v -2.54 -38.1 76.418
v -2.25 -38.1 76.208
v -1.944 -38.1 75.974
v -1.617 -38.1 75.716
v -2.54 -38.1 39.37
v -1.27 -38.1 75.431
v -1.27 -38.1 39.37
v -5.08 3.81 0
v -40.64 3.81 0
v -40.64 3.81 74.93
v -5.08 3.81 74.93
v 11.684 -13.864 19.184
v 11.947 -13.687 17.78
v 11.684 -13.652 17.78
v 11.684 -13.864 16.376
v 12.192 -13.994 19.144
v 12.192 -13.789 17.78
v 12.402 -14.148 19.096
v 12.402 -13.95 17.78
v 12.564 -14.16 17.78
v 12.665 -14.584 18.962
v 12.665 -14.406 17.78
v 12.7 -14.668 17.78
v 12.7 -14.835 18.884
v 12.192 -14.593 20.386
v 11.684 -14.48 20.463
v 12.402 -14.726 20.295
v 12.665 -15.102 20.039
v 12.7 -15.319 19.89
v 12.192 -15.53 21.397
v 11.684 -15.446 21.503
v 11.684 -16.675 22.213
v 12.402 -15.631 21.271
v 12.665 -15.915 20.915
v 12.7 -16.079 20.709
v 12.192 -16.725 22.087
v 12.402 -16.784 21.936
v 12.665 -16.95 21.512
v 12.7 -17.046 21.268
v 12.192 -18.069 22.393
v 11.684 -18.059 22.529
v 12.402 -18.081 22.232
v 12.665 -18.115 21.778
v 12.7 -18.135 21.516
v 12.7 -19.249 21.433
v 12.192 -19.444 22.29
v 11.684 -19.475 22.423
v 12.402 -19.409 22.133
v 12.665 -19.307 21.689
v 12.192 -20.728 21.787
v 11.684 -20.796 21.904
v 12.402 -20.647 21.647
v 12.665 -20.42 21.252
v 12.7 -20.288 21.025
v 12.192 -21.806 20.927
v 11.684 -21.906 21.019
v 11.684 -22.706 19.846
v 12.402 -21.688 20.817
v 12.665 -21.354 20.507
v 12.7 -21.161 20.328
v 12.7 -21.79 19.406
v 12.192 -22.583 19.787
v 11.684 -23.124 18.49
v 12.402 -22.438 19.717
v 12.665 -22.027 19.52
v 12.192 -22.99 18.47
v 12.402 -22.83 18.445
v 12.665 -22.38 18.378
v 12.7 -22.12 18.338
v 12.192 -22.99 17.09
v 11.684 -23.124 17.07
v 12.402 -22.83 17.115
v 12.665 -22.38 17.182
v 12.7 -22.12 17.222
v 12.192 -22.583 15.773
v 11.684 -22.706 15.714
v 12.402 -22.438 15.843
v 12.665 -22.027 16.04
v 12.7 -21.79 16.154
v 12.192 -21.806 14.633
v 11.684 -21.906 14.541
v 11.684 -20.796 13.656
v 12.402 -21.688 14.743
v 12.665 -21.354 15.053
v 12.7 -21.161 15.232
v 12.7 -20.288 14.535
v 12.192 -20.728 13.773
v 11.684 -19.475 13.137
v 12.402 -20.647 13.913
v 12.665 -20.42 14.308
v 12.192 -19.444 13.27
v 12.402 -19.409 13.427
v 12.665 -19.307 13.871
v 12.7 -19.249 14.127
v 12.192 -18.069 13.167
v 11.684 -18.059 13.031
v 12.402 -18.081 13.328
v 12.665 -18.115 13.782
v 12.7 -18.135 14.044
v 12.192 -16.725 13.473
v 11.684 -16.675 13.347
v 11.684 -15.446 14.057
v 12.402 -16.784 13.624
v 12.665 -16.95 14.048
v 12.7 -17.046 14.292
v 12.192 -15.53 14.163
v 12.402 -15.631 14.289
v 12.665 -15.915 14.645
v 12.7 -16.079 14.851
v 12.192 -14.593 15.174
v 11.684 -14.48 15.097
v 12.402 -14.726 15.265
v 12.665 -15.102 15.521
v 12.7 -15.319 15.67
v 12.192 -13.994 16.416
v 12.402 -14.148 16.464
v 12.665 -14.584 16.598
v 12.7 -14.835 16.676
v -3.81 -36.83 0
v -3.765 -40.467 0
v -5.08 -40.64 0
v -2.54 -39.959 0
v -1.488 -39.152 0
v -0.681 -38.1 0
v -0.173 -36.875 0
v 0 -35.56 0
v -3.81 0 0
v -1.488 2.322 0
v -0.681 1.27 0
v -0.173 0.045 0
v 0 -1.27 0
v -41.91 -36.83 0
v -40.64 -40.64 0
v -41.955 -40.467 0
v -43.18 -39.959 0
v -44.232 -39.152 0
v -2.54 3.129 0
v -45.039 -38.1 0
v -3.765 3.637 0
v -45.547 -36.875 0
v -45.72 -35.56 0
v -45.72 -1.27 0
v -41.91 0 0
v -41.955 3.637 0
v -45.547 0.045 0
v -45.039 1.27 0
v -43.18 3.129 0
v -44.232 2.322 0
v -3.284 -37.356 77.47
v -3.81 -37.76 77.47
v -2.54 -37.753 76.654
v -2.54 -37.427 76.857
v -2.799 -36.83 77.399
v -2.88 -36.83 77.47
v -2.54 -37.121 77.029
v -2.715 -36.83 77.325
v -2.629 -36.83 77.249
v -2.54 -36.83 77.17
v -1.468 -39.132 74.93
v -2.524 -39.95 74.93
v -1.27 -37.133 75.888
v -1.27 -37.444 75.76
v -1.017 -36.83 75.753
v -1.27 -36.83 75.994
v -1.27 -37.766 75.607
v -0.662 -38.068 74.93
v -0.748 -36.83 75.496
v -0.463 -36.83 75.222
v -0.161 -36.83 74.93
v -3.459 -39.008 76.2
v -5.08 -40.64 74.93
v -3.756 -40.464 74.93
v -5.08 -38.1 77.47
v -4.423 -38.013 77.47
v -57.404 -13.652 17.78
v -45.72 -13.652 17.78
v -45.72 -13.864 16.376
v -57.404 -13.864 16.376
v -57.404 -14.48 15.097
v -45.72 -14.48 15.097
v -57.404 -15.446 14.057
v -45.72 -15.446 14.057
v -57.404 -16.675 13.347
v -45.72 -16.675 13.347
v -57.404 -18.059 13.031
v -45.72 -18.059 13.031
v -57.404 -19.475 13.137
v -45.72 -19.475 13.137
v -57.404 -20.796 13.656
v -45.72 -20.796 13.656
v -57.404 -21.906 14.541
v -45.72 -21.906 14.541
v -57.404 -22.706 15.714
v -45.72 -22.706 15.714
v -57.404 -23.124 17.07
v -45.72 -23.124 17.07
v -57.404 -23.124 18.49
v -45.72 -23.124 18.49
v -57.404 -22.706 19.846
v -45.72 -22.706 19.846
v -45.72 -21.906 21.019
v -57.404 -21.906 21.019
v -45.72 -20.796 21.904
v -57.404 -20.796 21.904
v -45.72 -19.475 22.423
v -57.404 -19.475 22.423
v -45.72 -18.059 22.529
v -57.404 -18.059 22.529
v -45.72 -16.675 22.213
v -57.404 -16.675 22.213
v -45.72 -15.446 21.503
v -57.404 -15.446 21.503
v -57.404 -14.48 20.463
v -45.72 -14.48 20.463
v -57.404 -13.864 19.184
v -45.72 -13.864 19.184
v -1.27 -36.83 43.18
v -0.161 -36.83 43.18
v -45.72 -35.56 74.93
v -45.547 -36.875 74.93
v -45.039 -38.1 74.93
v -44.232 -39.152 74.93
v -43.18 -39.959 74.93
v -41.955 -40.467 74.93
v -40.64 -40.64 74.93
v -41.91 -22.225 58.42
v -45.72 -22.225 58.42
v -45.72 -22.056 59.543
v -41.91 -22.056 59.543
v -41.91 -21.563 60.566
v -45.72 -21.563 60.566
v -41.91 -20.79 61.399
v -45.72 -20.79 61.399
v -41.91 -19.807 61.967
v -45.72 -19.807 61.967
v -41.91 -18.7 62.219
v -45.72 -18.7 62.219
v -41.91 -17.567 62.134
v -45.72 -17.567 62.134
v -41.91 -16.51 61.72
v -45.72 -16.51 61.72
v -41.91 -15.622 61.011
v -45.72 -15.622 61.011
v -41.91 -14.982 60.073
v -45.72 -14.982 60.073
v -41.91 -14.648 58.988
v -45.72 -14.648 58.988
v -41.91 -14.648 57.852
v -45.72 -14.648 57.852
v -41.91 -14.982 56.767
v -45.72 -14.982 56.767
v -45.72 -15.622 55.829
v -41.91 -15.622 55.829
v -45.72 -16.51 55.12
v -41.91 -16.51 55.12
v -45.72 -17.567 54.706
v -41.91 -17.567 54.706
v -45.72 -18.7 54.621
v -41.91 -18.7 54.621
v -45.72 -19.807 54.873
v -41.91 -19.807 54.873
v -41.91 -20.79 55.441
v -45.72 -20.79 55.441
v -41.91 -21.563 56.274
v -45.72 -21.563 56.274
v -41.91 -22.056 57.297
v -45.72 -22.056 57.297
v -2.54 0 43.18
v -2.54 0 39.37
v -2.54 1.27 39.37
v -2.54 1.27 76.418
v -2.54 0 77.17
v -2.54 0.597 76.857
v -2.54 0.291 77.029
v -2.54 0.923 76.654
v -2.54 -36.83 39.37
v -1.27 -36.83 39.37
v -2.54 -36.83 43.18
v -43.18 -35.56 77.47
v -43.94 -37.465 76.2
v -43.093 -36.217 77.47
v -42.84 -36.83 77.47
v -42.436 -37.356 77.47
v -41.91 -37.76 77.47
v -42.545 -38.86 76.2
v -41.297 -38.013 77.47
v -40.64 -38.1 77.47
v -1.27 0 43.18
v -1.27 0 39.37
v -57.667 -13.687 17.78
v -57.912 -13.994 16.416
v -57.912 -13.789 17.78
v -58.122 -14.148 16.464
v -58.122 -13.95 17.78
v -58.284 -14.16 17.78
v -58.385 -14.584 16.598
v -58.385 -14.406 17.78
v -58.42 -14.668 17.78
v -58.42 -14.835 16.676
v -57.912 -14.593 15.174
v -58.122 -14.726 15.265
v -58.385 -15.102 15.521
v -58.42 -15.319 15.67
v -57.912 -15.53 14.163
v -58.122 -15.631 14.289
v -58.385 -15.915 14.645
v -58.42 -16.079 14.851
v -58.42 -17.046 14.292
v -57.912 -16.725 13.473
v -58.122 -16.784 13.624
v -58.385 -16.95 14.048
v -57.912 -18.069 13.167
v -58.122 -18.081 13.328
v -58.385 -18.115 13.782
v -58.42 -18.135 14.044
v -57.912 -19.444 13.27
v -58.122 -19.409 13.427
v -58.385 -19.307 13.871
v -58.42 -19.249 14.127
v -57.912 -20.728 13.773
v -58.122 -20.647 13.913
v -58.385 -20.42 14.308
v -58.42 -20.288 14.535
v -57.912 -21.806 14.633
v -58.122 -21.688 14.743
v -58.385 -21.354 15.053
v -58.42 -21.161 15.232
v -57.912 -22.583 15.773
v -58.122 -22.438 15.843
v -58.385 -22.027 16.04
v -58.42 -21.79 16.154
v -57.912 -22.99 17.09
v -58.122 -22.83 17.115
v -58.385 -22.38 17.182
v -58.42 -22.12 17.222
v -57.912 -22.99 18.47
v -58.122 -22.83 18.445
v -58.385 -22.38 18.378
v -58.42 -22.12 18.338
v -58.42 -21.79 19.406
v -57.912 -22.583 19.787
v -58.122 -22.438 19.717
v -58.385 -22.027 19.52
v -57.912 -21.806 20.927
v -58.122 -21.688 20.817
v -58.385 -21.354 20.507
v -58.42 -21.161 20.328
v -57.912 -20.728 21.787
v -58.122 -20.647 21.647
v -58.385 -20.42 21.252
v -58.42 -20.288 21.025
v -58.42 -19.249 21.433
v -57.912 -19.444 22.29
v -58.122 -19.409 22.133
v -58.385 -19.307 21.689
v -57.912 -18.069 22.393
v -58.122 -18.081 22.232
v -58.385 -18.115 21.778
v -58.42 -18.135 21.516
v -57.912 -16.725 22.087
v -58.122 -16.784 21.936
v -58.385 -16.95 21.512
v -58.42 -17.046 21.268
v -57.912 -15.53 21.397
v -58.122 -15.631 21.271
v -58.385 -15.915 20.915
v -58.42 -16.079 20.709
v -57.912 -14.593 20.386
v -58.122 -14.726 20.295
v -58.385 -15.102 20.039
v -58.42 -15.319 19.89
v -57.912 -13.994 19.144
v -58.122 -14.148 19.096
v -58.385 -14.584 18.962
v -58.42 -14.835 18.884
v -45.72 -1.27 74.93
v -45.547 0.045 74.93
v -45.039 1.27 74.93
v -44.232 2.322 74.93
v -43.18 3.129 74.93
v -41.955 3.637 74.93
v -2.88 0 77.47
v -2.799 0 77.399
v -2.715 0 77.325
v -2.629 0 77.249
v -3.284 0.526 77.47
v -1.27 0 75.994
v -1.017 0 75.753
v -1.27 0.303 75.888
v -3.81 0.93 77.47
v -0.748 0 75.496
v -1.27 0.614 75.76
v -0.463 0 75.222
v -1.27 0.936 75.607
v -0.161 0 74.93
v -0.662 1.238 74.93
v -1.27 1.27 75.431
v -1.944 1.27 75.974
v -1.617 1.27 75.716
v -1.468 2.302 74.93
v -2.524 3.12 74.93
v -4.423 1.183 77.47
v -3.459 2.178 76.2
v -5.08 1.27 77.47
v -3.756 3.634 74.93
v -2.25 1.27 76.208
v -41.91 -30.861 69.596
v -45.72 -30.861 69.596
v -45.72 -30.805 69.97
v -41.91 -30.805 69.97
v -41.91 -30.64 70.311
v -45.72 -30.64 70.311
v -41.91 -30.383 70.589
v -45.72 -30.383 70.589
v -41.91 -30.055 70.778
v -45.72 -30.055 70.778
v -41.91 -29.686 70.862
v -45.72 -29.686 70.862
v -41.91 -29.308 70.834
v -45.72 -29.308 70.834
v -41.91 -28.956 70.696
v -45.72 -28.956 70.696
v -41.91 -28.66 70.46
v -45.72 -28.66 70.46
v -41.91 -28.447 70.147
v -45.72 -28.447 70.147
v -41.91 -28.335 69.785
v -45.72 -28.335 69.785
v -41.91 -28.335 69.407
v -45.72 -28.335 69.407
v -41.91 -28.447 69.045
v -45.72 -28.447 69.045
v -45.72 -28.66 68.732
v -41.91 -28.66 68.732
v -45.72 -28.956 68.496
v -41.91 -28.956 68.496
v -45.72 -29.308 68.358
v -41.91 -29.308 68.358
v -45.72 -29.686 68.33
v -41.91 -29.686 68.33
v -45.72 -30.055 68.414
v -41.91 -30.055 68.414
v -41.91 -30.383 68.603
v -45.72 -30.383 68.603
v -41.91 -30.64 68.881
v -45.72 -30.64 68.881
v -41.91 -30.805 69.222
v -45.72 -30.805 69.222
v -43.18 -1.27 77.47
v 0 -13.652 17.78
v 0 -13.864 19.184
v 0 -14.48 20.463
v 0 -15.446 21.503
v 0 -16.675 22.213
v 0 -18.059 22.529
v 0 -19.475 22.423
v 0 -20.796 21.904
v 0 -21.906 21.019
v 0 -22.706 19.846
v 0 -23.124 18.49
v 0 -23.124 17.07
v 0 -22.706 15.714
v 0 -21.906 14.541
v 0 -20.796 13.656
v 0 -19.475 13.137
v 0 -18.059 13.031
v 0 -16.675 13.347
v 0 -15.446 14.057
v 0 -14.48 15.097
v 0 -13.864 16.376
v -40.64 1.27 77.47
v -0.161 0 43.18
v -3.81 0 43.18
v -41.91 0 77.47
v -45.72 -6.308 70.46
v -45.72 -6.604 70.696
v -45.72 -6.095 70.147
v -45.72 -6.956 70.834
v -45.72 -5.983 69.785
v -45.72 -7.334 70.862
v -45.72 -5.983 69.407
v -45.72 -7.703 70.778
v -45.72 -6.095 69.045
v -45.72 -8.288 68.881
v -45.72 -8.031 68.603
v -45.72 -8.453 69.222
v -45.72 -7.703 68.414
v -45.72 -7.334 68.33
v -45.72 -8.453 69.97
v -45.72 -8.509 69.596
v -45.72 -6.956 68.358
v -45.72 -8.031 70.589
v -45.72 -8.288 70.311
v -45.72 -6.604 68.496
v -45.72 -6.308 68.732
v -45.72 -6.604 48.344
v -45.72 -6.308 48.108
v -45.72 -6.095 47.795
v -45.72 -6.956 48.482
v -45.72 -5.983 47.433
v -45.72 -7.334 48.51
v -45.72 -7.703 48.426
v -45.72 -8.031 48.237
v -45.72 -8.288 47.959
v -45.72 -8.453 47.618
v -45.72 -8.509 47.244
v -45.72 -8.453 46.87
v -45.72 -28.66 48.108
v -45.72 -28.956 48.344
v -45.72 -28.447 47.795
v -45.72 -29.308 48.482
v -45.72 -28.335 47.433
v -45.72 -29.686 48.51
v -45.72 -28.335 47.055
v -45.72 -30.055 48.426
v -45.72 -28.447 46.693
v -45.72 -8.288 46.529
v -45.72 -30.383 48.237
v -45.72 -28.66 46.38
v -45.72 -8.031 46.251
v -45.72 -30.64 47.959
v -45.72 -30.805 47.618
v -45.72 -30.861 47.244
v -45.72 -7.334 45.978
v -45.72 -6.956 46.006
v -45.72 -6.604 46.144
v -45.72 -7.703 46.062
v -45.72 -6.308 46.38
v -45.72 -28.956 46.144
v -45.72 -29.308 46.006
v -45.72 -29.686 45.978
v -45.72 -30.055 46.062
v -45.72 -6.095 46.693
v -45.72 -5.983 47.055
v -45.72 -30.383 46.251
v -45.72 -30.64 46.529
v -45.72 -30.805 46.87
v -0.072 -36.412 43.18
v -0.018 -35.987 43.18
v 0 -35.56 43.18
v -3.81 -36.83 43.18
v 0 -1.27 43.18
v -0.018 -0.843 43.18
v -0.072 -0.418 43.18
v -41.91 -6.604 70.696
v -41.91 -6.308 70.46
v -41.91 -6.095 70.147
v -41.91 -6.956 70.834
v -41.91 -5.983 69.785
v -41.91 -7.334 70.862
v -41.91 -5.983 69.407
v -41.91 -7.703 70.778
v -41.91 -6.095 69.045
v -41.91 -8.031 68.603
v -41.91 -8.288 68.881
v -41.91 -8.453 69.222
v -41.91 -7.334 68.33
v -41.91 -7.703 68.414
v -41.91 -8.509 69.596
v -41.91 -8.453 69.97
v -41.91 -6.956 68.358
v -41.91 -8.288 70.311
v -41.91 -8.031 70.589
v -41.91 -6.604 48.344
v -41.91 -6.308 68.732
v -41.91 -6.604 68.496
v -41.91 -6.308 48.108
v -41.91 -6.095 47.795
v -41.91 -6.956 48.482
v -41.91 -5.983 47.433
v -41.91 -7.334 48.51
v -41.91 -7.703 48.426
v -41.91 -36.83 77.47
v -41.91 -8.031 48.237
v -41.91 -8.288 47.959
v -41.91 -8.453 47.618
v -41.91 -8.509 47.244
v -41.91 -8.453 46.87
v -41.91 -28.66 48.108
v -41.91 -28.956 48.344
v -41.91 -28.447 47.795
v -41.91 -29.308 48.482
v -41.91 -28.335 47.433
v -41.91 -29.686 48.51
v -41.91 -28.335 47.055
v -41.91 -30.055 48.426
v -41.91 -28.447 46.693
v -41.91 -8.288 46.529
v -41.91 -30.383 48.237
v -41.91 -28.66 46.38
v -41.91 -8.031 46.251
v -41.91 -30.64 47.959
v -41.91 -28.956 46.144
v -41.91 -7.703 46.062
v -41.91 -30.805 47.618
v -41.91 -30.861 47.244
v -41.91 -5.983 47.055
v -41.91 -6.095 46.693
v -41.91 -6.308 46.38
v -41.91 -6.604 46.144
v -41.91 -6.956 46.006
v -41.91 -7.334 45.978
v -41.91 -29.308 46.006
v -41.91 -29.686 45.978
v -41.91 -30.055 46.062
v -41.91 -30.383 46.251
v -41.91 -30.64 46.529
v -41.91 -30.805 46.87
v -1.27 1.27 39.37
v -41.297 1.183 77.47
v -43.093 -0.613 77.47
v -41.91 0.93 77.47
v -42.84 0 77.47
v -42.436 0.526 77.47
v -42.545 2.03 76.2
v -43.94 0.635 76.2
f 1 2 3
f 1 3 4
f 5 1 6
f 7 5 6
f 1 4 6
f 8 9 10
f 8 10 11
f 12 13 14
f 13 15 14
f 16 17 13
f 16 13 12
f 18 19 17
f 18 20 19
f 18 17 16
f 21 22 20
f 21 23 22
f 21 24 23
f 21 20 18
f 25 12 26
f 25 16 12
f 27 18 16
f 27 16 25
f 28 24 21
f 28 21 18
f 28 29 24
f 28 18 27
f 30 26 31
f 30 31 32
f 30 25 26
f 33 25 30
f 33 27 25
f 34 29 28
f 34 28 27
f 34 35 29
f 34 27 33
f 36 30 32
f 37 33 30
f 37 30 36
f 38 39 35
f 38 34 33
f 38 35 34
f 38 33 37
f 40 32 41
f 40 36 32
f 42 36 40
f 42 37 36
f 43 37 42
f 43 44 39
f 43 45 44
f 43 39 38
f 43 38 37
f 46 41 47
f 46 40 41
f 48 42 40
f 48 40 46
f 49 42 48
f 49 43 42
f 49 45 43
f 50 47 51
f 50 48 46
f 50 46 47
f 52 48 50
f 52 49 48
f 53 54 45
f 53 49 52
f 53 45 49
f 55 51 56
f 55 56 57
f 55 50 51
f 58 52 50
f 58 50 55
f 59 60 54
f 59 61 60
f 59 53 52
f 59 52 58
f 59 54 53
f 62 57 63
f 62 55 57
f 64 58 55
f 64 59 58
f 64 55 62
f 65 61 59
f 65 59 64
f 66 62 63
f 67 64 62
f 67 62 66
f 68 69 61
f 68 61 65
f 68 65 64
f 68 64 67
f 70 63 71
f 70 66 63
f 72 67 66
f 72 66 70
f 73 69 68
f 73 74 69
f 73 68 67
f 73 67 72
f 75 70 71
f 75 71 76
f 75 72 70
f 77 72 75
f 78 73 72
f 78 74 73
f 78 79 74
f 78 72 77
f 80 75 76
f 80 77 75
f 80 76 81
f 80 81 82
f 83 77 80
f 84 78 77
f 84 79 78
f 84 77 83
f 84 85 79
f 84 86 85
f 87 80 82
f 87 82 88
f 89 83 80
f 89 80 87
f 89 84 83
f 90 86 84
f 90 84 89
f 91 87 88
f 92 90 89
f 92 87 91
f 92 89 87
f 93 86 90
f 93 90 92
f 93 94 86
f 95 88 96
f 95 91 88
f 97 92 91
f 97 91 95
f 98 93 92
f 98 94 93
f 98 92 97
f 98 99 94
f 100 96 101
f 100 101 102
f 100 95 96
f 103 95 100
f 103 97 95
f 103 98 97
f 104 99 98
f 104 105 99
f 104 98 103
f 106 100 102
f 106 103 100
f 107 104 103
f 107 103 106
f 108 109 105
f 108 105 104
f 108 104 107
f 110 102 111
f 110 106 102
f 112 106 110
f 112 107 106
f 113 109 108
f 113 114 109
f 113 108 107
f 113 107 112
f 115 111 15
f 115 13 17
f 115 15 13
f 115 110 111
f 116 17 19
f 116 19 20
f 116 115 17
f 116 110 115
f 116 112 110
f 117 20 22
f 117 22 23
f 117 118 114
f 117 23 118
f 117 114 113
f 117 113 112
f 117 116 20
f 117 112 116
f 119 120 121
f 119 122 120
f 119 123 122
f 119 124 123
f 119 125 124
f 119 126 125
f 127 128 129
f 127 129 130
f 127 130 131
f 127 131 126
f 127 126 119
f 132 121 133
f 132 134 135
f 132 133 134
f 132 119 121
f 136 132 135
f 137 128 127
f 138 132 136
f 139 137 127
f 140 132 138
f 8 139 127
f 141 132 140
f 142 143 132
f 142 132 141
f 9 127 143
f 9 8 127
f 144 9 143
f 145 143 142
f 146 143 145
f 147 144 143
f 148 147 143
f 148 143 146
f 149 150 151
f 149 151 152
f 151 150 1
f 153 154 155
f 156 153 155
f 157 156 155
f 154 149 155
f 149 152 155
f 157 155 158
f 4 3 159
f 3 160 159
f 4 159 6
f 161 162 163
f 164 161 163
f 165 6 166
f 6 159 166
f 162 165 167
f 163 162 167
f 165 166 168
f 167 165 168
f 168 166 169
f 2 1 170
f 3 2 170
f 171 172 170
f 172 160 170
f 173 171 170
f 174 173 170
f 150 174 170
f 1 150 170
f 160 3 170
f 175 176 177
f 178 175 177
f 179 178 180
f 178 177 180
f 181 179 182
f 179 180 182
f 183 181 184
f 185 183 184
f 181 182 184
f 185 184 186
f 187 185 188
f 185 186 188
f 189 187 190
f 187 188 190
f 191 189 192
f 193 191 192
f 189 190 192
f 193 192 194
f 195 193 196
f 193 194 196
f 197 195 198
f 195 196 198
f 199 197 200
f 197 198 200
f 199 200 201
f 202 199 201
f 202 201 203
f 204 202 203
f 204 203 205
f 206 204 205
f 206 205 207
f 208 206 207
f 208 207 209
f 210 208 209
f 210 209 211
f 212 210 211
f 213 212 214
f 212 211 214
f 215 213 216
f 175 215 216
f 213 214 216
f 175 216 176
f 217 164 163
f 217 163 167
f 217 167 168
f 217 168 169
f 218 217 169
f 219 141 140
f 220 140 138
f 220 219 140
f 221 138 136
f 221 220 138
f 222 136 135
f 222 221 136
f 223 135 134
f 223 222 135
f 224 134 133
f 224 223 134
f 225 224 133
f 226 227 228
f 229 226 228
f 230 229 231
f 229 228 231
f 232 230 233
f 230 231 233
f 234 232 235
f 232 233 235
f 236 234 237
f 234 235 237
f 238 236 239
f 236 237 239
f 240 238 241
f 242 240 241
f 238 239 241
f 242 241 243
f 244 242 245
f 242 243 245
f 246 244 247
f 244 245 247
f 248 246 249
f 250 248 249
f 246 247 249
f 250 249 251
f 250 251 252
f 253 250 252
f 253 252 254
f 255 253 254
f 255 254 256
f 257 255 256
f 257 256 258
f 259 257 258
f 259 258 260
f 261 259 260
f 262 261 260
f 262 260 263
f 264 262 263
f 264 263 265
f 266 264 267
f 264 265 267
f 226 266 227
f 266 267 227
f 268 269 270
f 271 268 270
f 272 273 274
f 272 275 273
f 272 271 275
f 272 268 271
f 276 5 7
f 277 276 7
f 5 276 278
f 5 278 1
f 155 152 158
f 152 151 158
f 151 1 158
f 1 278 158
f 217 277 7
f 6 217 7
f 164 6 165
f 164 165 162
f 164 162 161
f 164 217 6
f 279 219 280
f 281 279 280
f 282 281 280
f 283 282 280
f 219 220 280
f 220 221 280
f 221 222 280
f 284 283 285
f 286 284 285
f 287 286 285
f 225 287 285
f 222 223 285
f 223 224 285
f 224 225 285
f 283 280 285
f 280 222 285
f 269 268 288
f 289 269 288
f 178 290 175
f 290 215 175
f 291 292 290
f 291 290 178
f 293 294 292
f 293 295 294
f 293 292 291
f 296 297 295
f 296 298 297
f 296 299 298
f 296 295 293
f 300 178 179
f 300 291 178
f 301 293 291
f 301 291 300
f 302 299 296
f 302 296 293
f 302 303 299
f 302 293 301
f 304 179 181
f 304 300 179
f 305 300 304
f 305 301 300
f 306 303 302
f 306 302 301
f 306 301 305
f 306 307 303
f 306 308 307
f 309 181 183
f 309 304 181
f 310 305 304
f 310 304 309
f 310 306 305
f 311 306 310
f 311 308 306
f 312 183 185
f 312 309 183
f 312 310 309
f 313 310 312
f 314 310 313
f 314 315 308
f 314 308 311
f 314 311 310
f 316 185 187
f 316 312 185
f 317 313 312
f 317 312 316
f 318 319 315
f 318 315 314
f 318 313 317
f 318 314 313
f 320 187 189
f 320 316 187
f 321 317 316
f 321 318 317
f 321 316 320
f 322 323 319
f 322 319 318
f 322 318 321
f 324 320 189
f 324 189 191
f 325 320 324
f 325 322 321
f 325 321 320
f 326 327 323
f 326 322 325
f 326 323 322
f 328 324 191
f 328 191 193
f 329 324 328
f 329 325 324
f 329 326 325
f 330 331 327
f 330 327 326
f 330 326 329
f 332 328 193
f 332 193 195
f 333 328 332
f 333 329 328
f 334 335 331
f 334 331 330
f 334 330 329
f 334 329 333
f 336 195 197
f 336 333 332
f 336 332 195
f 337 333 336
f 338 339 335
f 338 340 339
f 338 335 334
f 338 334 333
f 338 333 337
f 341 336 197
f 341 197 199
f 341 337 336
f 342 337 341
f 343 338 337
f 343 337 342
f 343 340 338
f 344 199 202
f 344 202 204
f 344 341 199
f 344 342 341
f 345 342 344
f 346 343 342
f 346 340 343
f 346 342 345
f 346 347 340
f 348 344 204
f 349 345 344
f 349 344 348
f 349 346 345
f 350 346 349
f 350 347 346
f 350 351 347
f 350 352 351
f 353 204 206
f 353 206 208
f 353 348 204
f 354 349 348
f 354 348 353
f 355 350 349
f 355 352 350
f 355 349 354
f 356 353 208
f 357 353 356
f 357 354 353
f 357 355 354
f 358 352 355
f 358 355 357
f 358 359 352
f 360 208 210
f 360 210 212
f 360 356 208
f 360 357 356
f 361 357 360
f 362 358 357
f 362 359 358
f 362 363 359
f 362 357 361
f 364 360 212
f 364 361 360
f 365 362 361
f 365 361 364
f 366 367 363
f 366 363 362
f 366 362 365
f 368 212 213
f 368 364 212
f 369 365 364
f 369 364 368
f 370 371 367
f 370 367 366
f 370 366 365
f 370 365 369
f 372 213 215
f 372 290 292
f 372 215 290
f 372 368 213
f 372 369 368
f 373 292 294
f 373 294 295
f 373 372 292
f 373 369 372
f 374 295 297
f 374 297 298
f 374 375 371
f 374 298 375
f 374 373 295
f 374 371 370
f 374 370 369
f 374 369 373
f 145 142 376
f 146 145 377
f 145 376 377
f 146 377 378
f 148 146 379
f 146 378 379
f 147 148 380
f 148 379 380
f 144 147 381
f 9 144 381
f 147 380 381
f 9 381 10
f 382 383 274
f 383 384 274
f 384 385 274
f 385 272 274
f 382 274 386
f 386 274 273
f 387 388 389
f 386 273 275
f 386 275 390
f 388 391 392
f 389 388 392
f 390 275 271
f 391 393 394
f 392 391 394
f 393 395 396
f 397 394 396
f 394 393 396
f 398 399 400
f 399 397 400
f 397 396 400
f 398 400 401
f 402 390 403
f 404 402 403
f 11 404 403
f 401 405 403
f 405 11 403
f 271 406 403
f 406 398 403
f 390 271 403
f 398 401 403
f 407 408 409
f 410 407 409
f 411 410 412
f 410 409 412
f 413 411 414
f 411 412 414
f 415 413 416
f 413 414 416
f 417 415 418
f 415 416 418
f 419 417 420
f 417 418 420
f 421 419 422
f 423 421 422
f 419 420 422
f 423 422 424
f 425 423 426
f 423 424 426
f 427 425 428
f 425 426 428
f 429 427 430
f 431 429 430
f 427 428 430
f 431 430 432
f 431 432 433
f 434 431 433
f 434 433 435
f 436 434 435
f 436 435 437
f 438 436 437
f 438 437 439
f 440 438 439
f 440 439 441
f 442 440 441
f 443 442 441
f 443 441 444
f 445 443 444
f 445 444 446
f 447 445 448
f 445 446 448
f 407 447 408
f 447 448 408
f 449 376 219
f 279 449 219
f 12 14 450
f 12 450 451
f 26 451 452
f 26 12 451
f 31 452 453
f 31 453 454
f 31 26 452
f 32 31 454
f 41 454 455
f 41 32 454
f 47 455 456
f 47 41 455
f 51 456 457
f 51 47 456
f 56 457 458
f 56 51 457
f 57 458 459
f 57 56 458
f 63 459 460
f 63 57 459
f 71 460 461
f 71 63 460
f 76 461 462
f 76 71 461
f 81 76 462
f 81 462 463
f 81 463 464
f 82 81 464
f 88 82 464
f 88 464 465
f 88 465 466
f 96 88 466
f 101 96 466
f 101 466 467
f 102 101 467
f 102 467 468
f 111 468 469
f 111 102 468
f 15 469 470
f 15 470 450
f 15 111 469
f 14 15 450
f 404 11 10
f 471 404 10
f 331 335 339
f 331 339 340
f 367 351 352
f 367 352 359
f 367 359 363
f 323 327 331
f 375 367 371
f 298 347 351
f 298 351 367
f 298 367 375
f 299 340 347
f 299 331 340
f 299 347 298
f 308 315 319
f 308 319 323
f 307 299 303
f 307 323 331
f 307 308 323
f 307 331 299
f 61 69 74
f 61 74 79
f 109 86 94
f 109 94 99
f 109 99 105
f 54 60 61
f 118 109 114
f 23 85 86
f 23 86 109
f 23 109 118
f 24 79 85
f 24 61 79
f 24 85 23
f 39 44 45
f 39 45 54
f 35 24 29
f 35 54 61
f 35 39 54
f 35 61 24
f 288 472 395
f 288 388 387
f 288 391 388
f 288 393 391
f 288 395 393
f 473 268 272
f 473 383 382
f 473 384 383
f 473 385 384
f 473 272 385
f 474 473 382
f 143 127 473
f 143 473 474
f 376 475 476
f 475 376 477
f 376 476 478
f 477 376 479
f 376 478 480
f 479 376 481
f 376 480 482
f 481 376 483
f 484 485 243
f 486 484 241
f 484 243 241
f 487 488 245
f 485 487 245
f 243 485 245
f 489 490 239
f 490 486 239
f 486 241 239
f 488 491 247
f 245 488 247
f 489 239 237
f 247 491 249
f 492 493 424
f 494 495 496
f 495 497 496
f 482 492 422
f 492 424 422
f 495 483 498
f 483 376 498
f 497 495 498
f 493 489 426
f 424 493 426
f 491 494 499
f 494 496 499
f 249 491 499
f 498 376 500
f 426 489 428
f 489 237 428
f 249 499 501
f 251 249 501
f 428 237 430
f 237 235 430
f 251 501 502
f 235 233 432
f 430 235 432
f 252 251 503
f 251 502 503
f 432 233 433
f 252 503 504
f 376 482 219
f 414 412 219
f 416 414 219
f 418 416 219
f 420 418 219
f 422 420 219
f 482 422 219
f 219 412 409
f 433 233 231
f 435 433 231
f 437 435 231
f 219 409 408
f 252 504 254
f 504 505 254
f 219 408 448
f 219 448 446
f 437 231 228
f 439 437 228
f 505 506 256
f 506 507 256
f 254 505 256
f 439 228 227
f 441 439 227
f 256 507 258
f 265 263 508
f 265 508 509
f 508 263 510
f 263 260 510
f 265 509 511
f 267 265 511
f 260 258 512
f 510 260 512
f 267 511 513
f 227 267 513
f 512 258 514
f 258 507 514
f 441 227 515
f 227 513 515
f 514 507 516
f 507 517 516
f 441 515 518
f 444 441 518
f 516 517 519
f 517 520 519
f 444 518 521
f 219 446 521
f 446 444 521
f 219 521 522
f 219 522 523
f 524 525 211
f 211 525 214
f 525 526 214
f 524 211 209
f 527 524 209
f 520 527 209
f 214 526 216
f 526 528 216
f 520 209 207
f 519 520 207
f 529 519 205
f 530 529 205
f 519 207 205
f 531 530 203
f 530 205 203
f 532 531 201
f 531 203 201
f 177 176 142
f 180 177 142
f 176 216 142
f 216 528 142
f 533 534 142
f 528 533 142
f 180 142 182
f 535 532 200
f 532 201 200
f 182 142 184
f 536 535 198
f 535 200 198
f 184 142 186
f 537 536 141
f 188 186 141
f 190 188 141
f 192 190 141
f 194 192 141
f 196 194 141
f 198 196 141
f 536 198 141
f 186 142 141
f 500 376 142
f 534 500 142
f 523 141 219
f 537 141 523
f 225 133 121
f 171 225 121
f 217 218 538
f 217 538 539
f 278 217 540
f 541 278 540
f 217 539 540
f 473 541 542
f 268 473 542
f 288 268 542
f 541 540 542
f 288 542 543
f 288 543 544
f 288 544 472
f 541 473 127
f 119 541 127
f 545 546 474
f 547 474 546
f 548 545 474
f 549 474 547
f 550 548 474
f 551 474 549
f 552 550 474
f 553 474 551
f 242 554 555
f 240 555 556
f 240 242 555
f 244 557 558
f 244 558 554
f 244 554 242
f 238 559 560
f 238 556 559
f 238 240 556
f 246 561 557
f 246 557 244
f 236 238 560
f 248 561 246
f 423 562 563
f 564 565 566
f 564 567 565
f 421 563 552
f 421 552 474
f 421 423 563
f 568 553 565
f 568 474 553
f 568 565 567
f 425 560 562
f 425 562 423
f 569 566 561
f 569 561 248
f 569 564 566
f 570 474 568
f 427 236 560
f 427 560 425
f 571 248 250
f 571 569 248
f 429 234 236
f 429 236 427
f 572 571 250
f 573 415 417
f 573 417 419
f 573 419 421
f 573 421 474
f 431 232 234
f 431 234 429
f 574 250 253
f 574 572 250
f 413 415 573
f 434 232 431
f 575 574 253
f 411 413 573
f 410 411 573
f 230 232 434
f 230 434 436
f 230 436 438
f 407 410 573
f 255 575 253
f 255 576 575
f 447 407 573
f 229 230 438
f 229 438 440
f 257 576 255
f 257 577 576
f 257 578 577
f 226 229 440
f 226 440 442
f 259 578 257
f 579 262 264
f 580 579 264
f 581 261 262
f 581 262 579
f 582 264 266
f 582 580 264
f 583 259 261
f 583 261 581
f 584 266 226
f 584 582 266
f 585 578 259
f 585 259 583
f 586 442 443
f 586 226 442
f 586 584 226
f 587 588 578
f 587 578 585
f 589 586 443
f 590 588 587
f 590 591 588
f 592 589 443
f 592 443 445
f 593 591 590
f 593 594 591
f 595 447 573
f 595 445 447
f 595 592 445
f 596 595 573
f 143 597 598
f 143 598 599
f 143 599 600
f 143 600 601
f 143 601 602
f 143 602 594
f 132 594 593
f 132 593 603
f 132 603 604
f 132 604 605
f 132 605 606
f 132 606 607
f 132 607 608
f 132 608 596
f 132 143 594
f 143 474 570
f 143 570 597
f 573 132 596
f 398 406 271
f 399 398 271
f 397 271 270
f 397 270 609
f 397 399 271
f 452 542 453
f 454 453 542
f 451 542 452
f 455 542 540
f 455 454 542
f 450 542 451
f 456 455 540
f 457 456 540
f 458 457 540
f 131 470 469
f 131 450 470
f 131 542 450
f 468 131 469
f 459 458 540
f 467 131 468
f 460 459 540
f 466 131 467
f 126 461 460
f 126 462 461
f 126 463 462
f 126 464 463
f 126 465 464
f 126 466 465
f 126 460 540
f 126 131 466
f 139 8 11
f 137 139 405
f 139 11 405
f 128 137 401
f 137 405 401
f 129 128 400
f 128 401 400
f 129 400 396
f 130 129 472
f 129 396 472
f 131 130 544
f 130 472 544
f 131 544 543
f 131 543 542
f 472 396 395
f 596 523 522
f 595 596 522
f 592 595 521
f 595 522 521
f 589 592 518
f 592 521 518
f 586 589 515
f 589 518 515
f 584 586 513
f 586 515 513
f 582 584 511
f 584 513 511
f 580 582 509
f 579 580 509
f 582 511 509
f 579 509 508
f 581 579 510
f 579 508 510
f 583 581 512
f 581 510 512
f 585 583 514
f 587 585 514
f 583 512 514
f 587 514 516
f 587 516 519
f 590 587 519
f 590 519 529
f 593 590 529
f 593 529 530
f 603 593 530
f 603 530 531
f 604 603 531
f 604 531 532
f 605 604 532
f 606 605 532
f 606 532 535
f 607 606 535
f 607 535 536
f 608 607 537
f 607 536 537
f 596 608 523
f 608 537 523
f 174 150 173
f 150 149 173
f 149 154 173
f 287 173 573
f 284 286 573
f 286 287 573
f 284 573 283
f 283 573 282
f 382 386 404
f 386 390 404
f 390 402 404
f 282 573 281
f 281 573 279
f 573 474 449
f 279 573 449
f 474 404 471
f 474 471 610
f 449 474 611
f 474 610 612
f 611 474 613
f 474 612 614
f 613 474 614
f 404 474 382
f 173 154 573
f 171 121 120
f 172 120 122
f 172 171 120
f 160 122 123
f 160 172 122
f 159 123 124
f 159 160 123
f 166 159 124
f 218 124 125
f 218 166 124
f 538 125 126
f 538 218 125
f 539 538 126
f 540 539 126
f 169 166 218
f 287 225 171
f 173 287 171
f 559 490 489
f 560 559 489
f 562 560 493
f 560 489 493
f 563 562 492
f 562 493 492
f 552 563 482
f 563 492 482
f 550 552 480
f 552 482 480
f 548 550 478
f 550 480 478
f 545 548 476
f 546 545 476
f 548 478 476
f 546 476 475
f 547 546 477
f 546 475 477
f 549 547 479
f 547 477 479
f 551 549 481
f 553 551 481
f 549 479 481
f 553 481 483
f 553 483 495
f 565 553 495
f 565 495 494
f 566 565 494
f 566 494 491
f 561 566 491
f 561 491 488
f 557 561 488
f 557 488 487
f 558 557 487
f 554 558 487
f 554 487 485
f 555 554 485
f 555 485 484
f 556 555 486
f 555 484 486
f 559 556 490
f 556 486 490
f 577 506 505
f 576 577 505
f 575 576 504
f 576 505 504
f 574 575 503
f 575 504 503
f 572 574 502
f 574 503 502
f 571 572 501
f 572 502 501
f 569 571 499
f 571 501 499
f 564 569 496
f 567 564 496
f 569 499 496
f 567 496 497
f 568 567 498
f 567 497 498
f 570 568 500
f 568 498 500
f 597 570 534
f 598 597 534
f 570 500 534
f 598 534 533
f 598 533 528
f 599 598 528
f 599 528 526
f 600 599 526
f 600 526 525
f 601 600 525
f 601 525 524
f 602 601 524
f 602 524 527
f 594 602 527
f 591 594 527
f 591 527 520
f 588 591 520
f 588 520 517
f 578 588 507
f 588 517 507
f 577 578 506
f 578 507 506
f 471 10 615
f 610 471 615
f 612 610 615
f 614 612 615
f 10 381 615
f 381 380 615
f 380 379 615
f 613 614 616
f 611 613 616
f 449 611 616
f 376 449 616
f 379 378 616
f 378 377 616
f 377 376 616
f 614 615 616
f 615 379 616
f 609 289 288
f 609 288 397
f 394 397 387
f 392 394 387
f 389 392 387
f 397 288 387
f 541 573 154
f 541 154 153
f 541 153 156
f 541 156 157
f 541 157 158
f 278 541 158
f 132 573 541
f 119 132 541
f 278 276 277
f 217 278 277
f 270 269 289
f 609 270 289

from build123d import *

# Parameters (mm, degrees)
BOSS_EXTRUDE1_DEPTH = 77.47
SKETCH2_W           = 43.18
SKETCH2_H           = 44.45
BOSS_EXTRUDE2_DEPTH = 3.81
SKETCH3_R           = 3.81
SKETCH3_R_2         = 1.27
CUT_EXTRUDE1_DEPTH  = 3.81
SKETCH4_R           = 4.7625
BOSS_EXTRUDE3_DEPTH = 12.7
BOSS_EXTRUDE4_START = 12.7
SKETCH5_R           = 4.7625
BOSS_EXTRUDE4_DEPTH = 12.7
FILLET1_R           = 1.016
SKETCH6_W           = 1.27
SKETCH6_H           = 38.1
CUT_EXTRUDE2_DEPTH  = 1.27
FILLET2_R           = 5.08
CHAMFER1_SIZE       = 2.54


with BuildPart() as part:
    # Sketch1 → Boss-Extrude1 (new body)
    with BuildSketch(Plane.XY):
        Polygon((0, 0), (-41.91, 0), (-41.91, -36.83), (0, -36.83), (0, -40.64), (-41.91, -40.64), (-45.72, -40.64), (-45.72, 0), (-45.72, 3.81), (0, 3.81), align=None)
    extrude(amount=BOSS_EXTRUDE1_DEPTH)

    # Sketch2 → Boss-Extrude2 (add)
    with BuildSketch(Plane(origin=(0, 0, 0), x_dir=(0, 0, -1), z_dir=(1, 0, 0))):
        with Locations((-21.59, -18.415)):
            Rectangle(SKETCH2_W, SKETCH2_H)
    extrude(amount=-BOSS_EXTRUDE2_DEPTH)

    # Sketch3 → Cut-Extrude1 (cut)
    with BuildSketch(Plane.ZY.offset(45.72)):
        with Locations(Location((58.42, -18.415, 0), (0, 0, 270))):
            Circle(SKETCH3_R)
        with Locations(Location((47.244, -7.239, 0), (0, 0, 270))):
            Circle(SKETCH3_R_2)
        with Locations(Location((69.596, -7.239, 0), (0, 0, 270))):
            Circle(SKETCH3_R_2)
        with Locations(Location((69.596, -29.591, 0), (0, 0, 270))):
            Circle(SKETCH3_R_2)
        with Locations(Location((47.244, -29.591, 0), (0, 0, 270))):
            Circle(SKETCH3_R_2)
    extrude(amount=-CUT_EXTRUDE1_DEPTH, mode=Mode.SUBTRACT)

    # Sketch4 → Boss-Extrude3 (add)
    with BuildSketch(Plane.ZY.offset(45.72)):
        with Locations(Location((17.78, -18.415, 0), (0, 0, 90))):
            Circle(SKETCH4_R)
    extrude(amount=BOSS_EXTRUDE3_DEPTH)

    # Sketch5 → Boss-Extrude4 (add)
    with BuildSketch(Plane(origin=(0, 0, 0), x_dir=(0, 0, -1), z_dir=(1, 0, 0)).offset(BOSS_EXTRUDE4_START)):
        with Locations(Location((-17.78, -18.415, 0), (0, 0, 90))):
            Circle(SKETCH5_R)
    extrude(amount=-BOSS_EXTRUDE4_DEPTH)

    # Fillet1
    fillet1_edges = [part.edges().sort_by_distance(p)[0] for p in [
        (-58.42, -23.1775, 17.78),
        (12.7, -23.1775, 17.78),
    ]]
    fillet(fillet1_edges, radius=FILLET1_R)

    # Sketch6 → Cut-Extrude2 (cut)
    with BuildSketch(Plane.XZ):
        with Locations((-1.905, 58.42)):
            Rectangle(SKETCH6_W, SKETCH6_H)
    cut_extrude2 = extrude(amount=-CUT_EXTRUDE2_DEPTH, mode=Mode.SUBTRACT)

    # Mirror1: Cut-Extrude2 across plane
    add(cut_extrude2.mirror(Plane(origin=(0, -18.415, 0), x_dir=(0, 0, 1), z_dir=(0, -1, 0))), mode=Mode.SUBTRACT)

    # Fillet2
    fillet2_edges = [part.edges().sort_by_distance(p)[0] for p in [
        (-45.72, 3.81, 38.735),
        (0, 3.81, 38.735),
        (0, -40.64, 38.735),
        (-45.72, -40.64, 38.735),
    ]]
    fillet(fillet2_edges, radius=FILLET2_R)

    # Chamfer1
    chamfer1_edges = [part.edges().sort_by_distance(p)[0] for p in [
        (-1.969148027, -39.576092628, 77.47),
        (-22.86, -40.64, 77.47),
        (-44.232102448, -39.152102448, 77.47),
        (-45.72, -18.415, 77.47),
        (-1.969148027, 2.746092628, 77.47),
        (-44.232102448, 2.322102448, 77.47),
        (-22.86, 3.81, 77.47),
    ]]
    chamfer(chamfer1_edges, length=CHAMFER1_SIZE)


solid = part.part
